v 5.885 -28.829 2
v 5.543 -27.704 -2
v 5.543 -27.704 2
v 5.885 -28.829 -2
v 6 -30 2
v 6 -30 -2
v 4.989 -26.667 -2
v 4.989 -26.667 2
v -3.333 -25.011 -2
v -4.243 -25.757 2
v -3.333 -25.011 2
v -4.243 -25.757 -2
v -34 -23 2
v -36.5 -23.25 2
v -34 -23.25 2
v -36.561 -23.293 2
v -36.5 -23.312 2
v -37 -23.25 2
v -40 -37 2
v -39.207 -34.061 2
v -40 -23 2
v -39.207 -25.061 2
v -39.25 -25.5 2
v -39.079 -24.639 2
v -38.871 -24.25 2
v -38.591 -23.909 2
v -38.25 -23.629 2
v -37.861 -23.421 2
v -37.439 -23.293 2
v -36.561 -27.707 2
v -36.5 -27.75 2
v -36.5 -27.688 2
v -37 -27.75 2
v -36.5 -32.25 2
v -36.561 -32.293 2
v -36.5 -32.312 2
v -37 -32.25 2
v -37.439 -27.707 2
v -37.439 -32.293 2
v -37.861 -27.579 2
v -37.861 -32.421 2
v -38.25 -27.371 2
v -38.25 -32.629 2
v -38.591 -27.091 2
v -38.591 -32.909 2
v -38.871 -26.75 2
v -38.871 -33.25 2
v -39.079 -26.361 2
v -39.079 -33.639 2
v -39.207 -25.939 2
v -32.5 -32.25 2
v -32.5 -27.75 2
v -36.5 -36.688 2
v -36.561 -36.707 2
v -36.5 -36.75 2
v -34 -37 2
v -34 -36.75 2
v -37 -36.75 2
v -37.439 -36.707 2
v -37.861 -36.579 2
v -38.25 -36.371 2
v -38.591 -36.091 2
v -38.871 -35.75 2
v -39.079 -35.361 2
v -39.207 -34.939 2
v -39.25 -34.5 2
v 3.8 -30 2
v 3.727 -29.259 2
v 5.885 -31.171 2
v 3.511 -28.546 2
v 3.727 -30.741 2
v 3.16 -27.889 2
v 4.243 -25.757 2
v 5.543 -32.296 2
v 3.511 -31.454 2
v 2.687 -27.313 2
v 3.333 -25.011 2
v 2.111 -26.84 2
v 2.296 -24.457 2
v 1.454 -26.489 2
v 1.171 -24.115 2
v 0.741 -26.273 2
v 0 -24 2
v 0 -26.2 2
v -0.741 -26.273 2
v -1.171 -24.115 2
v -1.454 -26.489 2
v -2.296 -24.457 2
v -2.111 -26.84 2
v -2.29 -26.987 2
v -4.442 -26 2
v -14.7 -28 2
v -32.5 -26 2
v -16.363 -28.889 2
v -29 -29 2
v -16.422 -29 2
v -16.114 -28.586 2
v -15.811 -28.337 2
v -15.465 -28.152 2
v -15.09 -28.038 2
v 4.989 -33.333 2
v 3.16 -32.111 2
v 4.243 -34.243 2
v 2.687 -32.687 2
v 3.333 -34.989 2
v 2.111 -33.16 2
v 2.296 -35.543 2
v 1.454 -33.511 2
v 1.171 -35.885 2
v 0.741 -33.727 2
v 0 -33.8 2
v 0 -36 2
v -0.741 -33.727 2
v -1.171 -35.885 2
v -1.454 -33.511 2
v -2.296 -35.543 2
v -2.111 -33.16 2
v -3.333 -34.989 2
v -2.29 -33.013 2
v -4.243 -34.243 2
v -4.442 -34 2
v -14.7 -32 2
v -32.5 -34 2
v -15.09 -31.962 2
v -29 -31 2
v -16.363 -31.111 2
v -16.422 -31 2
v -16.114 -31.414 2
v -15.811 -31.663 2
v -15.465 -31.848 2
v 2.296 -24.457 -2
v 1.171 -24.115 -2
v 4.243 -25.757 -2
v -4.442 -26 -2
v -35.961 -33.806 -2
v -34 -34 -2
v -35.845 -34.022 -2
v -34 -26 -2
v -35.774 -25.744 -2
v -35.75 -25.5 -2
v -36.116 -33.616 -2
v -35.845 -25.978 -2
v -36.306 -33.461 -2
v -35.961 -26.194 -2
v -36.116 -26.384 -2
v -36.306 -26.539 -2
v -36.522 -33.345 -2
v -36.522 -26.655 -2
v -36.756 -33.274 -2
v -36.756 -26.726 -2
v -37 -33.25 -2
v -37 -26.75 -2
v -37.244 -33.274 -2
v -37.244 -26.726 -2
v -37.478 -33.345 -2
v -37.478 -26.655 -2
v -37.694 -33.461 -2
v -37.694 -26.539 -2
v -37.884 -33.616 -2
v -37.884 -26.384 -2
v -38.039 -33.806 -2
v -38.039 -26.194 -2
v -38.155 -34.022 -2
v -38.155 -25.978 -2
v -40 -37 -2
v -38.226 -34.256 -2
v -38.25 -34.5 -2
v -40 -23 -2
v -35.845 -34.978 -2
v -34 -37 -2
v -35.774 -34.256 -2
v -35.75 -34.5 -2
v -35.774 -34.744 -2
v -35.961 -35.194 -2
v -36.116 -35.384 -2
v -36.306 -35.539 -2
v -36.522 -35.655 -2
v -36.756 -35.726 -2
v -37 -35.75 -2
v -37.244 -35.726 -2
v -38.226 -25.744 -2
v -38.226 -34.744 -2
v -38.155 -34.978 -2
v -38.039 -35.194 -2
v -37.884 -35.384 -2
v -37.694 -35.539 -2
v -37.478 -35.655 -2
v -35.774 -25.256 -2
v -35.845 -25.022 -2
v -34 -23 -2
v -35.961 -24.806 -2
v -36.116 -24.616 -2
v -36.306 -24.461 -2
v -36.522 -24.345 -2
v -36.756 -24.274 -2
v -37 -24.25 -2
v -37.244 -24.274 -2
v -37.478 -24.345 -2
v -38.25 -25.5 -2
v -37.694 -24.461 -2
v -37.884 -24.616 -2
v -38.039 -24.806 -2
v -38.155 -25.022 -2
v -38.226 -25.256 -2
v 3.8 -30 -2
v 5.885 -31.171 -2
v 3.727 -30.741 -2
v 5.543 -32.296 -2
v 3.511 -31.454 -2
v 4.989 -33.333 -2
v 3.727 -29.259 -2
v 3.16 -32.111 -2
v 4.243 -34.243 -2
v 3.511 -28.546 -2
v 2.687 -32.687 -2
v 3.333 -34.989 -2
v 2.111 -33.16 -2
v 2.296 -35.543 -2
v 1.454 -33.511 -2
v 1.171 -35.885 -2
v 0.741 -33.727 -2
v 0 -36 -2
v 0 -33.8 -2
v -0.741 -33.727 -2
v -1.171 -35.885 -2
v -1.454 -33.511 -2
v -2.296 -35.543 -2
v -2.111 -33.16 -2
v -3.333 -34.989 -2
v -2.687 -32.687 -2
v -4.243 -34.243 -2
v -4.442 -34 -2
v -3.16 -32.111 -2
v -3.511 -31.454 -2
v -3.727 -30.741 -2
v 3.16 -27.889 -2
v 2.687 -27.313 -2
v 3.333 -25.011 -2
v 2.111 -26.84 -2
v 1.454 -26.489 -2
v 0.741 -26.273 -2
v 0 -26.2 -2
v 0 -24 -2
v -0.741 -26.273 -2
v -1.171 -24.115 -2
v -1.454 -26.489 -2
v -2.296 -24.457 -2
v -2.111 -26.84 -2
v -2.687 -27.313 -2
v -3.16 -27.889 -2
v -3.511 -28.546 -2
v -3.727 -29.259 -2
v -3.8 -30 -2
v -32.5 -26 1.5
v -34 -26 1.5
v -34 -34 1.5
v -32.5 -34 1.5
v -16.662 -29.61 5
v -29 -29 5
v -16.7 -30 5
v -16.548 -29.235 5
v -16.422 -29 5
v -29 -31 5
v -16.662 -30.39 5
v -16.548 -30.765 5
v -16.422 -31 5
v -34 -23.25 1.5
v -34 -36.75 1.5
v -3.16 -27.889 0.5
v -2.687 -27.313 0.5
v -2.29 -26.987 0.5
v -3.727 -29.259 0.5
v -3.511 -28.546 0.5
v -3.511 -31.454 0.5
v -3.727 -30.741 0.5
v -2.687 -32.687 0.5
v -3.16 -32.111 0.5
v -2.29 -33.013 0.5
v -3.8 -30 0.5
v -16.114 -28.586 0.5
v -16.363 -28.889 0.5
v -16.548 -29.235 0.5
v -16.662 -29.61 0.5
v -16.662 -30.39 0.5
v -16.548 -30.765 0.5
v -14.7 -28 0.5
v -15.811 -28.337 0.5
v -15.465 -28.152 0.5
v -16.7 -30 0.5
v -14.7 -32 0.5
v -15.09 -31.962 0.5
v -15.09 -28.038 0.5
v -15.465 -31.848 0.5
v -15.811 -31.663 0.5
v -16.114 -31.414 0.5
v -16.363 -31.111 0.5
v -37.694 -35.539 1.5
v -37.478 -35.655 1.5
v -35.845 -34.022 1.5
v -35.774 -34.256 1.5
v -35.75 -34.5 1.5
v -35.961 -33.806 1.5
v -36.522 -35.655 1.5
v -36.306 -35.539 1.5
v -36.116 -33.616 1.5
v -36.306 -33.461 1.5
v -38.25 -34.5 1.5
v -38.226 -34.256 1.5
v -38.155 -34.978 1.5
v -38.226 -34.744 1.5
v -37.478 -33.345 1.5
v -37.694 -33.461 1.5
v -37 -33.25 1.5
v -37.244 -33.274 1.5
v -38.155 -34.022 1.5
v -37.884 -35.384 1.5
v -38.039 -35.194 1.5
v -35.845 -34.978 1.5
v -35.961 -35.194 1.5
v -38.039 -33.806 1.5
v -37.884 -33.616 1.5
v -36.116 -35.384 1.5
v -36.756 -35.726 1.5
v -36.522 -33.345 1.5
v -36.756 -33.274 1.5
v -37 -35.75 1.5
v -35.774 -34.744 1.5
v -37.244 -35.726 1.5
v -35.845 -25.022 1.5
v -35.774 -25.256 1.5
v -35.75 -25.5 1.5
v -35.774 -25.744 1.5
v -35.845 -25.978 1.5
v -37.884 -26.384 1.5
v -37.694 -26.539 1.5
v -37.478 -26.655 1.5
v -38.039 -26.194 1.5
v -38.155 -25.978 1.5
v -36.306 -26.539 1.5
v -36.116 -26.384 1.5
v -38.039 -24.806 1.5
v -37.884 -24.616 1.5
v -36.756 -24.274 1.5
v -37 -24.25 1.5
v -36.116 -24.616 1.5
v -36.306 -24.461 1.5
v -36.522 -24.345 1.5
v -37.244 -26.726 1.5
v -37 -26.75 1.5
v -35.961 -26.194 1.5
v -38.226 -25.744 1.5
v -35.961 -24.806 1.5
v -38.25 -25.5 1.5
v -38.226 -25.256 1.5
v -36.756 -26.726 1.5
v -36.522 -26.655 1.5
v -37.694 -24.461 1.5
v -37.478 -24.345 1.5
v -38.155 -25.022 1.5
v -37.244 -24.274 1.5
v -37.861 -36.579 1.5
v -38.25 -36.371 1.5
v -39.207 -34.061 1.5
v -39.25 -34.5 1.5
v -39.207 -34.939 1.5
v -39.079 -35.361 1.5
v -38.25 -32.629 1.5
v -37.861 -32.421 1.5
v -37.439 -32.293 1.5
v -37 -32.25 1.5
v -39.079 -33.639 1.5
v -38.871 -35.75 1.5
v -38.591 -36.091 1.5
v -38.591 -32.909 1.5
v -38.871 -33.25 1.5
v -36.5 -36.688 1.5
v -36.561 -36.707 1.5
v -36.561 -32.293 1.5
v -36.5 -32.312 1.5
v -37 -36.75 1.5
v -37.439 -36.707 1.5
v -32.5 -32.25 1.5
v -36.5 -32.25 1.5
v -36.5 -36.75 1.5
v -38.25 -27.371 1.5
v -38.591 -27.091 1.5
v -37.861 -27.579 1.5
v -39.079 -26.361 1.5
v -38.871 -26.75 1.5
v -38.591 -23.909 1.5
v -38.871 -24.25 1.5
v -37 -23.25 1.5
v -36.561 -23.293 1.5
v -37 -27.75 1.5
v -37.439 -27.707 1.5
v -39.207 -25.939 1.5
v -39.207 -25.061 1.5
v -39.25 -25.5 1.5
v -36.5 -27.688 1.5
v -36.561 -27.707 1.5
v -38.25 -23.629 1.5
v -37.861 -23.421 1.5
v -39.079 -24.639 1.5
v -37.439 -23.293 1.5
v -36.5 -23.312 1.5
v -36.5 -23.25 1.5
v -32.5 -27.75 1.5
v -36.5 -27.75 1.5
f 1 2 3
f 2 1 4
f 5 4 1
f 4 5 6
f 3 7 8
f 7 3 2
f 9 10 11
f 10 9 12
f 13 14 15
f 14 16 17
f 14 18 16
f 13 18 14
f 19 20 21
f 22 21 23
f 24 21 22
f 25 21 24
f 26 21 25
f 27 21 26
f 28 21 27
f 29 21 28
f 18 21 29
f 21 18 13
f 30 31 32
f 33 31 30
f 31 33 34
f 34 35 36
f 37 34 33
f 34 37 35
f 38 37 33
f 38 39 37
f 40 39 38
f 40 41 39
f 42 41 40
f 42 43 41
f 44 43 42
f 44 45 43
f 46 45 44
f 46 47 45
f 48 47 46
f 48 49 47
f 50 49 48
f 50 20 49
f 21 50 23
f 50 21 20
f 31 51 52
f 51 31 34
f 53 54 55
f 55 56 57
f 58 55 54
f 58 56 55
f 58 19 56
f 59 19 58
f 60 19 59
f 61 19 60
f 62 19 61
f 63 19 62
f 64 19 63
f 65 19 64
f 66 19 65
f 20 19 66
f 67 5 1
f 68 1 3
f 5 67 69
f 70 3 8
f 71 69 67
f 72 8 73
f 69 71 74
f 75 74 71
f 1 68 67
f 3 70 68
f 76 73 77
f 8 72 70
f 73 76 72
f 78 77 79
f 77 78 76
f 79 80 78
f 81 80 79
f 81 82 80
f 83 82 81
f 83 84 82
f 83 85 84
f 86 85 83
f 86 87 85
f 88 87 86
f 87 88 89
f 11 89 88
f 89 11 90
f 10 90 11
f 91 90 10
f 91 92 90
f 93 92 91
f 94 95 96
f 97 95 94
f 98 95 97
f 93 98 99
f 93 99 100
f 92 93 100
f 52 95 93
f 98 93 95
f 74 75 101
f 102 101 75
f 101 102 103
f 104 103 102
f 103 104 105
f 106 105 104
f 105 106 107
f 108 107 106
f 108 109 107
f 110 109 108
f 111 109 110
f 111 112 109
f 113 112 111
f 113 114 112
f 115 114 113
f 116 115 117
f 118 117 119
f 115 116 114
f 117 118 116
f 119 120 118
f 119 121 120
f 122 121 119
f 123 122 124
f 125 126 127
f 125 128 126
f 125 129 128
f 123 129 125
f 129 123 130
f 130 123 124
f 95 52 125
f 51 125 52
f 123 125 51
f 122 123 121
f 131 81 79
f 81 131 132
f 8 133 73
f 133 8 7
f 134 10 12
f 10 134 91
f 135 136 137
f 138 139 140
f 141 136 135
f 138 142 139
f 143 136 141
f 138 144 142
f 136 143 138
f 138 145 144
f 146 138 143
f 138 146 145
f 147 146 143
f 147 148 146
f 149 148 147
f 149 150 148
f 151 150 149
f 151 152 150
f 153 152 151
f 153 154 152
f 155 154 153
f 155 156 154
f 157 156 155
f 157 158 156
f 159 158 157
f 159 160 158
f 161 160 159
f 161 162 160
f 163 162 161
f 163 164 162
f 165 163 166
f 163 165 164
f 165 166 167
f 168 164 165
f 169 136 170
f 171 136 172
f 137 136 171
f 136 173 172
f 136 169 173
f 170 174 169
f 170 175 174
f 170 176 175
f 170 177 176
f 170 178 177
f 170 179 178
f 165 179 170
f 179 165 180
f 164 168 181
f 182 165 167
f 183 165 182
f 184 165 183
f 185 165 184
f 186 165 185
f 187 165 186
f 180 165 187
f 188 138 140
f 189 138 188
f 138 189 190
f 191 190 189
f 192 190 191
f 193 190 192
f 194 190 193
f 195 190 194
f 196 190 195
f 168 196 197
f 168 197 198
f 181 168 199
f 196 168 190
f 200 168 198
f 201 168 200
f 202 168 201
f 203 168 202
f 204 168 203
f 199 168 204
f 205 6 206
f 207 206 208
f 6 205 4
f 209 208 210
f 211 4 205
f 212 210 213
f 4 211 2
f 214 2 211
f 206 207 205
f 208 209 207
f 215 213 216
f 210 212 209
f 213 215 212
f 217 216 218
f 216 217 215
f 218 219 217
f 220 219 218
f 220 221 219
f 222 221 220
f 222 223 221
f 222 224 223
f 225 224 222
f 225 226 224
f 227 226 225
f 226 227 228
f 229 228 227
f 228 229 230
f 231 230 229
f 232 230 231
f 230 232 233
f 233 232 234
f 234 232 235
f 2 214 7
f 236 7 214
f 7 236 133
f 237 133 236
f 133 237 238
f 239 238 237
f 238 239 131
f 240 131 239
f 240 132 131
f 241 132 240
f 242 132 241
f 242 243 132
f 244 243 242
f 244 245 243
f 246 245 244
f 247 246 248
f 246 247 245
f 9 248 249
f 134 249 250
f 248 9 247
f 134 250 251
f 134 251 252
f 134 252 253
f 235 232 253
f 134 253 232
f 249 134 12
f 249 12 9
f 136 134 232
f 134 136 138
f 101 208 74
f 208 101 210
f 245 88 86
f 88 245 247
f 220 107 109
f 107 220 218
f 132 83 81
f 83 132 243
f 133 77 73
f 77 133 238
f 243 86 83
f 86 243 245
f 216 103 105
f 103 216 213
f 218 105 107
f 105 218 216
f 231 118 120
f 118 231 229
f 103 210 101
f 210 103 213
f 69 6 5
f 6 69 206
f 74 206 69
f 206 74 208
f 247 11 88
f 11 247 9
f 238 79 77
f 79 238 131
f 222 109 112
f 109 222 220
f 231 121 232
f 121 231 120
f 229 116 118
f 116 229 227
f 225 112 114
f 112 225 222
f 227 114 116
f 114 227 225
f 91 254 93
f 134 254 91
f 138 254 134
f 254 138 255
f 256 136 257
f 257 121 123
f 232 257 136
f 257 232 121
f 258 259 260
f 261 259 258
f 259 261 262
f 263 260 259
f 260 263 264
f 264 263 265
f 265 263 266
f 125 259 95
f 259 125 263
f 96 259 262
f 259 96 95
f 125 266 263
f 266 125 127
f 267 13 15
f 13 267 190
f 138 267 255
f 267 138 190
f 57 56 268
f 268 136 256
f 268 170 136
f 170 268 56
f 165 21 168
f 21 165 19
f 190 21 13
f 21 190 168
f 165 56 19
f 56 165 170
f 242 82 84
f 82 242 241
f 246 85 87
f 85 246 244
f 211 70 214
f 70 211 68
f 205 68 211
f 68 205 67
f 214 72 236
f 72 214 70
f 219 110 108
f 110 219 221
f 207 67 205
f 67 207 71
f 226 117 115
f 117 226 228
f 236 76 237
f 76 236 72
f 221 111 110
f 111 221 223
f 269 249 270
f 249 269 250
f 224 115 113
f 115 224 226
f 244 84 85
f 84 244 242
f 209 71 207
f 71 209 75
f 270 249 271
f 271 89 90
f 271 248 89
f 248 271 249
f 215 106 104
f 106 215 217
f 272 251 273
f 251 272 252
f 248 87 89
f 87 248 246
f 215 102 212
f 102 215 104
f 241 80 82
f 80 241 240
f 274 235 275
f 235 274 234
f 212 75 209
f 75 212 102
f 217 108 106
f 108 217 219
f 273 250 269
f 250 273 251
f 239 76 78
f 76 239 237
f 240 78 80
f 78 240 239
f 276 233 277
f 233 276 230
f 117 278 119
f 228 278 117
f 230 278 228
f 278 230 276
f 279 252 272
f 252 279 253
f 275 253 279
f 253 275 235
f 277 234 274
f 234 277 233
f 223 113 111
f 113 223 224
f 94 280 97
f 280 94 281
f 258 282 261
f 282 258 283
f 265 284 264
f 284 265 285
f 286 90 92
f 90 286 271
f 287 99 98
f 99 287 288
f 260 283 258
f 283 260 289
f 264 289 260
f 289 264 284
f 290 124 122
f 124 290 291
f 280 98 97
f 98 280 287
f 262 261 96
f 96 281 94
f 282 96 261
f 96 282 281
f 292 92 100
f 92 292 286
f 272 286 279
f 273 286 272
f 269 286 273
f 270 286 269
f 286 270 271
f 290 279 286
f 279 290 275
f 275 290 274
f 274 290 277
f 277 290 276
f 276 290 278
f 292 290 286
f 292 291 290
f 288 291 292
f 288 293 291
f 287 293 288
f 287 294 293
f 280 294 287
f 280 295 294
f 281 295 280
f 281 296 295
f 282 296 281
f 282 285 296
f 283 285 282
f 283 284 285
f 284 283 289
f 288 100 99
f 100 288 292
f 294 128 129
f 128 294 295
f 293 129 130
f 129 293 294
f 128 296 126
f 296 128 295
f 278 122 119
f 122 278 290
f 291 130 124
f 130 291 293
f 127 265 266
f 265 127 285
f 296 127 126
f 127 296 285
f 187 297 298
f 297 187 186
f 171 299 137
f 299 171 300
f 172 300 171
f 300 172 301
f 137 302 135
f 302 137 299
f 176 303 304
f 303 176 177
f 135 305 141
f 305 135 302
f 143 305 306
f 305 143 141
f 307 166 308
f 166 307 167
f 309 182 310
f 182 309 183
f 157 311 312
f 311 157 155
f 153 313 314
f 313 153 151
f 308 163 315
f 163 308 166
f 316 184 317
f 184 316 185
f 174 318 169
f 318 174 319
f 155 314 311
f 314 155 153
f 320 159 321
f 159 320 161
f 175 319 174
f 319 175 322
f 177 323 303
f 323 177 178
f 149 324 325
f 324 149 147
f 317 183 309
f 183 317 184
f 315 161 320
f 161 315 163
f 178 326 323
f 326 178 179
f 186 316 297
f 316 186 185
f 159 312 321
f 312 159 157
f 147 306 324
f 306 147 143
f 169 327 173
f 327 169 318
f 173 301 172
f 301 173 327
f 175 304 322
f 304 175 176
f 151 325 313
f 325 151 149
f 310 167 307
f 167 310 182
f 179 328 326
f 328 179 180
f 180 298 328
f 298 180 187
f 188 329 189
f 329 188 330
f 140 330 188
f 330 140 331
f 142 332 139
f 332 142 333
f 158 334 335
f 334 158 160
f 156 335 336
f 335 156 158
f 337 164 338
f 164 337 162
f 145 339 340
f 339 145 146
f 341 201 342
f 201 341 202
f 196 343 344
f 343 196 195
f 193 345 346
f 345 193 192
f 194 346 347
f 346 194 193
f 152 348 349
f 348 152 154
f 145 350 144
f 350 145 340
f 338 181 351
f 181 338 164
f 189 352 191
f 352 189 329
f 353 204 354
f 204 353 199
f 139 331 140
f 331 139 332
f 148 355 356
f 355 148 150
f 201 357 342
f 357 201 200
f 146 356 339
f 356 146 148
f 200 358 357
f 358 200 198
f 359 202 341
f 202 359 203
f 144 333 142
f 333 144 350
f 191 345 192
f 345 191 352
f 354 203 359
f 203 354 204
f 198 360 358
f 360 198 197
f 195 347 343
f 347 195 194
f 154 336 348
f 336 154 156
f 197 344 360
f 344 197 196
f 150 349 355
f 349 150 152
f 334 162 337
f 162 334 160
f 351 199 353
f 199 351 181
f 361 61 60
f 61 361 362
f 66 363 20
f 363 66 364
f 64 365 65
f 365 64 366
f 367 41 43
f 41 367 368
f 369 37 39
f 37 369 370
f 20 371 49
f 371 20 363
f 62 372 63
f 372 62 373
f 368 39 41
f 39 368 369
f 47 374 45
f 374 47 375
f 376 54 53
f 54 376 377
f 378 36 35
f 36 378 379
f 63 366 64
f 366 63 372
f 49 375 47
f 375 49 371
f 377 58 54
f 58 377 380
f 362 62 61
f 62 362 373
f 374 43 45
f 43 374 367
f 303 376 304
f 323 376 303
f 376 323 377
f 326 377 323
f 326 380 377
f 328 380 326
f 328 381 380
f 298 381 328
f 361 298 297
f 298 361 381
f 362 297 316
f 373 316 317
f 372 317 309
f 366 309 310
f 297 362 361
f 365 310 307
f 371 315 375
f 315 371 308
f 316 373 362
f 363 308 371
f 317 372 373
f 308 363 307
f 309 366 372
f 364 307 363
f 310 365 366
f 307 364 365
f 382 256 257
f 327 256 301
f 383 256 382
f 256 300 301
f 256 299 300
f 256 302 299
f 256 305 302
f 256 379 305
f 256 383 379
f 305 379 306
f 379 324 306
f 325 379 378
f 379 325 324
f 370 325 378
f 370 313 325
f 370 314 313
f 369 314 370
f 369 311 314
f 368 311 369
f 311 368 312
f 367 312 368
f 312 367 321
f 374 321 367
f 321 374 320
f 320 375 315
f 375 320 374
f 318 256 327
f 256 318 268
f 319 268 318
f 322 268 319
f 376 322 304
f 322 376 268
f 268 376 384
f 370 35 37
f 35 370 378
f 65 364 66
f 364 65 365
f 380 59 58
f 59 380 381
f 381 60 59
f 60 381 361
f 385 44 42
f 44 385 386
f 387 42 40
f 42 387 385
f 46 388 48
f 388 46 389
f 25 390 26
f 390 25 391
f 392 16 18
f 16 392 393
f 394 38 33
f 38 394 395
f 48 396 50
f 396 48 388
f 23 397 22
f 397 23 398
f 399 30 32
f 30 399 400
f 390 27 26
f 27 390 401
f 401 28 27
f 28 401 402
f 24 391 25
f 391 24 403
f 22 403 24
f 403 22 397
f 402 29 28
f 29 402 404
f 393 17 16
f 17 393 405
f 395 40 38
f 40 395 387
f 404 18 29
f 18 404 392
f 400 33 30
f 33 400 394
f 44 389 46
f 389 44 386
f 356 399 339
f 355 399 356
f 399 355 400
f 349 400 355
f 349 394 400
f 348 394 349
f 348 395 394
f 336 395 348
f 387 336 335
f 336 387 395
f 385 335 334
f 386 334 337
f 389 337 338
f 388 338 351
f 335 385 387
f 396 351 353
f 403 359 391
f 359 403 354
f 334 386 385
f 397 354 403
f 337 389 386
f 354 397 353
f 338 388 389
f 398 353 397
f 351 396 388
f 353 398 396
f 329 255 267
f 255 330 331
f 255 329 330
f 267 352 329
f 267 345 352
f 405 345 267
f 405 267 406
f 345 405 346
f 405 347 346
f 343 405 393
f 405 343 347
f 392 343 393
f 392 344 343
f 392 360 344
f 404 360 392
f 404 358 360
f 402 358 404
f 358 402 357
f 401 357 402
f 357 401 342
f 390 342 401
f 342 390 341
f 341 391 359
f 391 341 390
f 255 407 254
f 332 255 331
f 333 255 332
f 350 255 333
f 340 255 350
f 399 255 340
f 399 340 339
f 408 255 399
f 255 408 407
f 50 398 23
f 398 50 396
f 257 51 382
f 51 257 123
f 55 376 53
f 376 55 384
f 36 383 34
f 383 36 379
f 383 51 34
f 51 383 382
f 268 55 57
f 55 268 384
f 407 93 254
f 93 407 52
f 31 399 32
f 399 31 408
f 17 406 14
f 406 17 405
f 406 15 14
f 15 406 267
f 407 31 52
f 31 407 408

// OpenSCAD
//-- limit switch holder / servo arm extender for Auto Bed Leveling
//-- by AndrewBCN - Barcelona, Spain - November 2014
//-- GPLV3
//-- (armv3 below)

//-- remix of Thingiverse #167430 (armv1 below)
//-- by zennmaster

//-- remix of Thingiverse #209384 (armv2 below)
//-- by Stephen Castello

// Some measurements and features

// armv1 has a (fixed) length of 37mm,
// width is 10mm, thickness is 4mm,
// uses 2 x M2.5 screws and nuts to hold a small limit switch.
// Uses standard 9G microservo.

// armv2 is for a much larger limit switch and also
// apparently for a larger servo, although everything seems
// to be configurable. Default thickness is 5mm.
// Uses M3 screws and nuts to hold the limit switch.

// armv3 has a parametric length (default is 37mm), uses
// a T-profile with 4mm base thickness to avoid flexing,
// holds the small limit switch with either 2 x small M2.5
// screws and nuts or a nylon tie.
// Uses standard 9G microservo.
// The slot for the servo arm is properly shaped.


// arm body length, add approximately 8mm for total length
// i.e. with an arm length of 37mm, the distance between
// the servo center and the tip of the limit switch is 45mm

// Configure according to your extruder dimensions
arm_length=37; // [30:70]

module armv3() {
    difference() {
      // body
      union() {
      cylinder(r=6, h=4,center=true,$fn=32);
      translate([-arm_length/2,0,0]) cube([arm_length,8,4],center=true);
      // reinforcement
      translate([-arm_length/2,0,3]) cube([arm_length-16,2,4],center=true);
      // limit switch base
      translate([-arm_length,0,0]) cube([6,14,4],center=true);
      }
      
    // hole for servo spindle
    cylinder(r=3.8,h=10,center=true,$fn=32); 

    // slot for servo arm
    hull() {
      translate([0,0,5.5]) cylinder(r=3.2,h=10,center=true,$fn=32);
      translate([-14.7,0,5.5]) cylinder(r=2,h=10,center=true,$fn=32);
    }
    
    // holes for nylon tie or M2.5 screws holding limit switch
    translate([-arm_length,-4.5,0]) cylinder(r=1.25,h=10,center=true,$fn=32);
    translate([-arm_length,4.5,0]) cylinder(r=1.25,h=10,center=true,$fn=32);
    
    // some limit switches will fit better with this
    translate([-arm_length,-4.5,4]) cylinder(r=2.25,h=5,center=true,$fn=32);
    translate([-arm_length,4.5,4]) cylinder(r=2.25,h=5,center=true,$fn=32);    
    translate([-arm_length+2.5,-4.5,4]) cube([4,4.5,5],center=true);
    translate([-arm_length+2.5,4.5,4]) cube([4,4.5,5],center=true);    
    }
}


module armv1() {
  difference(){
    union(){
      difference(){
	roundedBox([10,37,4],4,true); //main body
	translate([0,0,3])
	  roundedBox([4.8,28,5],2.4,true);  //slot for servo arm
	translate([0,-12.5,-5])
	cylinder(r=3.75,h=10, $fn=30); //  Hole for servo spindle
      }

      translate([0,16.5,0])
      roundedBox([20,5,4],1.75,true); // Microswtich mount body
    }
    translate([0,16.5,-1])
    roundedBox([16,2.8,10],1.4,true);  // slot for mounting screws
  }
}

module armv2() {
  //////////////////////////////////////////////////////////////////////////////////////////////////
  // Created on 12/13/2013 by Stephen Castello
  // Last update: 2/22/2014
  // changed thickness to 5mm (4mm flexed alot)
  //////////////////////////////////////////////////////////////////////////////////////////////////
  // variables
  //////////////////////////////////////////////////////////////////////////////////////////////////
  Z_Rod_dia=10;				// diameter of Z rod
  Screw_dia=3.2;				// clamp screw diameter
  Screw_Thread_dia=2.5;		// screw hole diameter to make a 3mm threaded hole
  Switch_ht=15;				// height of holder
  Switch_thk = 5;				// thickness of holder
  Switch_hole_sep=22;		// distance between holes for switch (19 for mechanical endstop v1.2)
  Switch_hole_offset = 10;		// switch hole offest (mech endstop v1.2 doesn't have one)
  Nut_wrench_size = 5.5;		// wrench size of nut
  Nut_depth = 2.3;			// thickness of nut
  Nylok_depth = 4;			// thickness of nylok nut
  Lever_wd = 12;				// width of lever
  Lever_ht = 33;				// lever length
  Servo_dia = 8.2;			// outside diameter of servo lever
  //////////////////////////////////////////////////////////////////////////////////////////////////
  // make the parts
  //////////////////////////////////////////////////////////////////////////////////////////////////

  rotate([0,-90,0]) {
	  switch_side(0); // switch off to right == 1
	  lever();
  }

  //////////////////////////////////////////////////////////////////////////////////////////////////
  // modules for each part
  //////////////////////////////////////////////////////////////////////////////////////////////////

  module switch_side(Right) { // riser for switch
	  if(Right) {
		  difference() {
			  difference() {
				  difference() {
					  cube([Switch_thk,29,Switch_ht],false);
					  // screw holes for switch
					  rotate(a=[0,90,0]) {		
						  translate([-(Switch_ht-2.5), 4, 0]) {
							  cylinder(h = 11, r = Screw_dia/2, center = false, $fn=100);
						  }
					  }
					  rotate(a=[0,90,0]) {
						  translate(v = [-(Switch_ht-2.5)+Switch_hole_offset, 4+Switch_hole_sep, 0]) {
						  cylinder(h = 11, r = Screw_dia/2, center = false, $fn=100);
						  }
					  }
				  }
			  }
		  }
		  translate([0,12,11]) rotate([45,0,0]) cube([Switch_thk,5,5],false); // gusset
	  } else {
		  difference() {
			  difference() {
				  translate([0,-17,0]) {
					  difference() {
						  cube([Switch_thk,29,Switch_ht],false);
						  // screw holes for switch
						  rotate(a=[0,90,0]) {		
							  translate([-(Switch_ht-2.5)+Switch_hole_offset, 4, 0]) {
								  cylinder(h = 11, r = Screw_dia/2, center = false, $fn=100);
							  }
						  }
						  rotate(a=[0,90,0]) {
							  translate(v = [-(Switch_ht-2.5), 4+Switch_hole_sep, 0]) {
							  cylinder(h = 11, r = Screw_dia/2, center = false, $fn=100);
							  }
						  }
					  }
				  } // translate
			  }
		  }
		  translate([0,0,11]) rotate([45,0,0]) cube([Switch_thk,5,5],false); // gusset
	  }
  }

  //////////////////////////////////////////////////////////////////////////////////////////////////////////////

  module lever() {  // servo lever
	  difference() {
		  hull() {
			  translate([0,0,15]) cube([Switch_thk,Lever_wd,Lever_ht-5],false); // lever with a rounded end
			  translate([0,6,Lever_ht + 10.5]) rotate([0,90,0]) cylinder(h=Switch_thk,r=Lever_wd/2,$fn=50);
		  }
		  translate([2.6,3,15]) cube([Switch_thk/2,Lever_wd/2,Lever_ht-5],false); // groove
		  translate([-5,6,Lever_ht + 10]) rotate([0,90,0]) cylinder(h=20,r=Servo_dia/2,$fn=50); // servo arm hole
		  //notch_lever();  // added countersinks instead
	  }
  }

  //////////////////////////////////////////////////////////////////////////////////////////////////////////////

  module notch_lever()
  {
	  difference() { // space for servo mounting screw
		  hull() {   // must be adjusted if size is changed *************************************************************
			  translate([-1,15,35]) rotate([90,0,0]) cylinder(h=20,r=2,$fn=50);
			  translate([-1,23,50]) rotate([135,0,0]) cylinder(h=20,r=2,$fn=50);
			  translate([-1,3,36]) rotate([45,0,0]) cylinder(h=20,r=2,$fn=50);
		  }
		  translate([-1,6,47]) {
			  rotate([0,90,0]) minkowski() {
				  cube([Lever_wd-4,Switch_thk-4,Lever_ht], true);
				  cylinder(r=6,h=1,$fn=100);
			  }
		  }
	  }
  }

  //////////////////////end of Z stop servo mount.scad /////////////////////////////////////////////////
}

/*include <boxes.scad>; // required only by armv1
armv1();
translate([30,30,0]) armv2(); */
// print the part
translate([0,-30,0]) armv3();
//import("/home/andrea/git/RAM/Eroina/stl/piattaforma_3dprint_v2_zprobe.stl");
